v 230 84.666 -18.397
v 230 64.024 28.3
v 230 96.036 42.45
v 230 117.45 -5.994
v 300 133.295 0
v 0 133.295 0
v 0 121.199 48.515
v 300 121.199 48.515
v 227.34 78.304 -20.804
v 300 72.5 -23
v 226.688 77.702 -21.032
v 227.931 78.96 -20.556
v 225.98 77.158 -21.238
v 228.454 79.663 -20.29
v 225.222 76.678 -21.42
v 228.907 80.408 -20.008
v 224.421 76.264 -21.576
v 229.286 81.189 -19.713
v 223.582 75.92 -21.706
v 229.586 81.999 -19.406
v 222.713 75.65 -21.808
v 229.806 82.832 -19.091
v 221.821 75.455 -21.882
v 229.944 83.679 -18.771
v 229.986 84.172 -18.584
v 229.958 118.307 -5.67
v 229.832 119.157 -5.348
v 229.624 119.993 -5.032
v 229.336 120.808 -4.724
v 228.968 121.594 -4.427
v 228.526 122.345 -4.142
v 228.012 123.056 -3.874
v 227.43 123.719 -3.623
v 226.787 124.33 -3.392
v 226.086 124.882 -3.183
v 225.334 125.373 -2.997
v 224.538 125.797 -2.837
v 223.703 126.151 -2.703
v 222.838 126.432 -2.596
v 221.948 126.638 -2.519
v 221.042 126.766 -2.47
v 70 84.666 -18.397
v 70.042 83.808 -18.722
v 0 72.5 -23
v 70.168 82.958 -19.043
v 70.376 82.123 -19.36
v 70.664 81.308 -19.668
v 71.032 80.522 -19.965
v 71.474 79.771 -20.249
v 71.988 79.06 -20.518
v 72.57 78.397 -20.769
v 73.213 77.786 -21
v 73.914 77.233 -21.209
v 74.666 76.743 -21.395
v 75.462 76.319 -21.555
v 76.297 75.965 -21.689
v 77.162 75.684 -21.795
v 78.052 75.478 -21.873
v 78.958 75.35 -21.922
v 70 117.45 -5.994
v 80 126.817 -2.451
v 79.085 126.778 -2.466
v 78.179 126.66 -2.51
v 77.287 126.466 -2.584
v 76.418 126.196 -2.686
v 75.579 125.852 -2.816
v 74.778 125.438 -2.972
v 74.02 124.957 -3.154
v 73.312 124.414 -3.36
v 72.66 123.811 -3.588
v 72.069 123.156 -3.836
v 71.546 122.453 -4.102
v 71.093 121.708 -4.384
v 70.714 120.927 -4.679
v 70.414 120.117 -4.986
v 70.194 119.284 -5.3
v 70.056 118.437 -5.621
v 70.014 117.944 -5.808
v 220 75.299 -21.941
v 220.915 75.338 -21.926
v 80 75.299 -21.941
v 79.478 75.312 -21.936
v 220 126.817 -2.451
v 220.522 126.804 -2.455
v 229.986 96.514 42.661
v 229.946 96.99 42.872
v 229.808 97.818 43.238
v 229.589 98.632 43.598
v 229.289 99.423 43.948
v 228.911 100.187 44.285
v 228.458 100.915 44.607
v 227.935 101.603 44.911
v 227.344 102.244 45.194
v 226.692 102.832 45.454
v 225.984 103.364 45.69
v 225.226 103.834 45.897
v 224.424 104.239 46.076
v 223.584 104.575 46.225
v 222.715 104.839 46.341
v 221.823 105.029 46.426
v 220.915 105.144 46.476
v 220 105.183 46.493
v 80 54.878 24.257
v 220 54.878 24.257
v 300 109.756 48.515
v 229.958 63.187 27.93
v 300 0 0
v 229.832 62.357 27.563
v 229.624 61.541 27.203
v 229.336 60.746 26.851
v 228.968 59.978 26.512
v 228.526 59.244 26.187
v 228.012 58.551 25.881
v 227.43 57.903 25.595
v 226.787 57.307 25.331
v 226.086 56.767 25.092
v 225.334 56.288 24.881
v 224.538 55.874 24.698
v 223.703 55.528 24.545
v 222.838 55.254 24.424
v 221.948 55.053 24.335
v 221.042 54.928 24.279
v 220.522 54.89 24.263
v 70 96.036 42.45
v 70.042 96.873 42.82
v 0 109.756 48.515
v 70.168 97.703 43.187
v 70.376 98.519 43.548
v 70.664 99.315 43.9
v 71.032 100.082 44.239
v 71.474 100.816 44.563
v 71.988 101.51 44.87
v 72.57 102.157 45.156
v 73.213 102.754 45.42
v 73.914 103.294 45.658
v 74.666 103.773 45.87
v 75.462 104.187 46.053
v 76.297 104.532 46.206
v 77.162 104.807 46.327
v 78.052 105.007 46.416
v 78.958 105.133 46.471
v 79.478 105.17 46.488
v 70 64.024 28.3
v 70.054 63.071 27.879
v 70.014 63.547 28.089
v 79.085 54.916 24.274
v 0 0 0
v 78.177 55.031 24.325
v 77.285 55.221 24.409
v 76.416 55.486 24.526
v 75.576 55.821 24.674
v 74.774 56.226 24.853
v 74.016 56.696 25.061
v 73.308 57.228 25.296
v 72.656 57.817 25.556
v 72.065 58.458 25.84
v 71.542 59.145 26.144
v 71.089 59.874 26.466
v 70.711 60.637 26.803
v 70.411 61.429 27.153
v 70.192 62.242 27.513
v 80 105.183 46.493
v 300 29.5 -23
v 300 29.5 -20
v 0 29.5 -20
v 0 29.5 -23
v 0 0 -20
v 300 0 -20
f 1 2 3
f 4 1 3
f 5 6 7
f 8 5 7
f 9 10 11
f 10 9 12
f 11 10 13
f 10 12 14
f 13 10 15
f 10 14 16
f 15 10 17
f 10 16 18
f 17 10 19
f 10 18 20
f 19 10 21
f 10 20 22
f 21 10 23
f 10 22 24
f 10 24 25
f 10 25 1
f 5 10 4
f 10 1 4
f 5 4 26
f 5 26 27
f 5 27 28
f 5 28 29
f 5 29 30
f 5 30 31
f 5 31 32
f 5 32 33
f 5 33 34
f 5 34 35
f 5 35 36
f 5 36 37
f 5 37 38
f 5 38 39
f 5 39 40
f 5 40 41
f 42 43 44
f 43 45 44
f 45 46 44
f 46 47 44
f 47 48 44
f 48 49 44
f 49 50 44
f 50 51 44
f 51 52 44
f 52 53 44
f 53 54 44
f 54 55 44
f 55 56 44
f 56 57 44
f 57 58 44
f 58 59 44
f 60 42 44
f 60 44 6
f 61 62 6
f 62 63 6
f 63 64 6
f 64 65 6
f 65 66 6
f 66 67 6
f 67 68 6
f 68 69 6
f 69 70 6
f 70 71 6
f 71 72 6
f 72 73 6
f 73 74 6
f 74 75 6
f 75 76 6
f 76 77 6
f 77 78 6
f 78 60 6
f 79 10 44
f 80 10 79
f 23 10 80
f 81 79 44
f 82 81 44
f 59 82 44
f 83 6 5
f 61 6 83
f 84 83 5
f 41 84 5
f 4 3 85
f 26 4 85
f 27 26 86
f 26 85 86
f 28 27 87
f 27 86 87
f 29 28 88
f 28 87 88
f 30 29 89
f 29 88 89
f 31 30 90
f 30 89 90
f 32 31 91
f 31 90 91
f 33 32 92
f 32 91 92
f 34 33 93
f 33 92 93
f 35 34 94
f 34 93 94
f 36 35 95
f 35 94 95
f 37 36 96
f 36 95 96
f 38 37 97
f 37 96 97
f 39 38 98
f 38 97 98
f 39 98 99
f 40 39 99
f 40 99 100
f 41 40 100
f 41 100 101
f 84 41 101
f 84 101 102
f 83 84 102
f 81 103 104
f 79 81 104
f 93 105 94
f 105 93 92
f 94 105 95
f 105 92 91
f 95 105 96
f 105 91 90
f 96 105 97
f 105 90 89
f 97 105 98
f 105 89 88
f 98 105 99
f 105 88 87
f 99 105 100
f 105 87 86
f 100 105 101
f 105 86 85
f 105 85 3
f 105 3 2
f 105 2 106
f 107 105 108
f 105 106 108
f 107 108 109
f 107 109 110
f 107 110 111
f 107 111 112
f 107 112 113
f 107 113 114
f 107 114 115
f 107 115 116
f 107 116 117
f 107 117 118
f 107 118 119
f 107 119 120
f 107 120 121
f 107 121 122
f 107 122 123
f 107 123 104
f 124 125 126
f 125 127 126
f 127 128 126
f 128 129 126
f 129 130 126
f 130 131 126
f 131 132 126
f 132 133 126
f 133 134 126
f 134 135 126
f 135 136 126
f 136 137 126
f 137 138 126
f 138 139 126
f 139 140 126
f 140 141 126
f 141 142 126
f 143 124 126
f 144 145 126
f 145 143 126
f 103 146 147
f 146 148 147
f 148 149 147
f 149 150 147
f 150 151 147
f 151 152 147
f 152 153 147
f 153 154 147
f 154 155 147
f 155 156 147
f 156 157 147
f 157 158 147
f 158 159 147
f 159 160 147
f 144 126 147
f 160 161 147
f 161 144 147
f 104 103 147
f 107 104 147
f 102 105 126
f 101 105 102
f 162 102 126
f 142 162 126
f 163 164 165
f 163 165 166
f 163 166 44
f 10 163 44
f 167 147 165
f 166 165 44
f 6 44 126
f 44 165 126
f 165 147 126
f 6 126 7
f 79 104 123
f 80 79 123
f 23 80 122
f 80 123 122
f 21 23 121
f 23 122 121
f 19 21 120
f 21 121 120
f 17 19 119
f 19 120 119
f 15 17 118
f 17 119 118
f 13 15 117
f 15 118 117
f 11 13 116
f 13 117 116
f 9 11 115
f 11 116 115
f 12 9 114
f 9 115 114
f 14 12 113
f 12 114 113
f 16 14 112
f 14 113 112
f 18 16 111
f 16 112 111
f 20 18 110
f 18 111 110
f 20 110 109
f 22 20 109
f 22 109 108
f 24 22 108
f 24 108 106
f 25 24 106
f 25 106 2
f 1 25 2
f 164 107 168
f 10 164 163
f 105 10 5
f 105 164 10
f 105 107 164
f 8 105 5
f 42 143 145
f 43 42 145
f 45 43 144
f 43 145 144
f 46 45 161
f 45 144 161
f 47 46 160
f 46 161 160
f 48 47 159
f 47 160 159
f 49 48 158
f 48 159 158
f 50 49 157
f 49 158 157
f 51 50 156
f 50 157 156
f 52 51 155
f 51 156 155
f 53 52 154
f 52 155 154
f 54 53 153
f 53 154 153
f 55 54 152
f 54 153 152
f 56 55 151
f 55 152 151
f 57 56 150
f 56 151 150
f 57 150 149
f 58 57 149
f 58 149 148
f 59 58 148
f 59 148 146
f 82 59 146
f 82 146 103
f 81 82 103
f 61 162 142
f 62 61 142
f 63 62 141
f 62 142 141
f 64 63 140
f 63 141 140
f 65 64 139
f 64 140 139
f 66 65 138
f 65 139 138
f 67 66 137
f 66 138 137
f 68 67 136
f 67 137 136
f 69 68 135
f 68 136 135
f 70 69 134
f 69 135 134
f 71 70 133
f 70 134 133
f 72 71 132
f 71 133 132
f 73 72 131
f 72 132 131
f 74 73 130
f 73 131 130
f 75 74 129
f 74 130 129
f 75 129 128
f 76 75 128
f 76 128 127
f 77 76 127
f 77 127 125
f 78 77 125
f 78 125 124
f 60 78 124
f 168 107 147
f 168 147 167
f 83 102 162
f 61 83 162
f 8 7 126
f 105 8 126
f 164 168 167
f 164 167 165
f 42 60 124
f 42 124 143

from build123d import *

# Parameters (mm, degrees)
F1_DEPTH = 300
F3_DEPTH = 106


with BuildPart() as f1:
    # F0 (on Right) → F1 (new body)
    with BuildSketch(Plane.YZ):
        Polygon((0, 0), (0, -20), (29.5, -20), (29.5, -23), (72.5, -23), (133.294737, 0), (121.198642, 48.514786), (109.755708, 48.514786), align=None)
    extrude(amount=F1_DEPTH)

    # F2 (on face) → F3 (cut)
    with BuildSketch(Plane(origin=(0, 0, 0), x_dir=(1, 0, 0), z_dir=(0, -0.40429, 0.914631))):
        with BuildLine():
            Line((220, 115), (80, 115))
            ThreePointArc((80, 115), (72.928932, 112.071068), (70, 105))
            Line((70, 105), (70, 70))
            ThreePointArc((70, 70), (72.928932, 62.928932), (80, 60))
            Line((80, 60), (220, 60))
            ThreePointArc((220, 60), (227.071068, 62.928932), (230, 70))
            Line((230, 70), (230, 105))
            ThreePointArc((230, 105), (227.071068, 112.071068), (220, 115))
        make_face()
    extrude(amount=-F3_DEPTH, mode=Mode.SUBTRACT)


solid = f1.part
